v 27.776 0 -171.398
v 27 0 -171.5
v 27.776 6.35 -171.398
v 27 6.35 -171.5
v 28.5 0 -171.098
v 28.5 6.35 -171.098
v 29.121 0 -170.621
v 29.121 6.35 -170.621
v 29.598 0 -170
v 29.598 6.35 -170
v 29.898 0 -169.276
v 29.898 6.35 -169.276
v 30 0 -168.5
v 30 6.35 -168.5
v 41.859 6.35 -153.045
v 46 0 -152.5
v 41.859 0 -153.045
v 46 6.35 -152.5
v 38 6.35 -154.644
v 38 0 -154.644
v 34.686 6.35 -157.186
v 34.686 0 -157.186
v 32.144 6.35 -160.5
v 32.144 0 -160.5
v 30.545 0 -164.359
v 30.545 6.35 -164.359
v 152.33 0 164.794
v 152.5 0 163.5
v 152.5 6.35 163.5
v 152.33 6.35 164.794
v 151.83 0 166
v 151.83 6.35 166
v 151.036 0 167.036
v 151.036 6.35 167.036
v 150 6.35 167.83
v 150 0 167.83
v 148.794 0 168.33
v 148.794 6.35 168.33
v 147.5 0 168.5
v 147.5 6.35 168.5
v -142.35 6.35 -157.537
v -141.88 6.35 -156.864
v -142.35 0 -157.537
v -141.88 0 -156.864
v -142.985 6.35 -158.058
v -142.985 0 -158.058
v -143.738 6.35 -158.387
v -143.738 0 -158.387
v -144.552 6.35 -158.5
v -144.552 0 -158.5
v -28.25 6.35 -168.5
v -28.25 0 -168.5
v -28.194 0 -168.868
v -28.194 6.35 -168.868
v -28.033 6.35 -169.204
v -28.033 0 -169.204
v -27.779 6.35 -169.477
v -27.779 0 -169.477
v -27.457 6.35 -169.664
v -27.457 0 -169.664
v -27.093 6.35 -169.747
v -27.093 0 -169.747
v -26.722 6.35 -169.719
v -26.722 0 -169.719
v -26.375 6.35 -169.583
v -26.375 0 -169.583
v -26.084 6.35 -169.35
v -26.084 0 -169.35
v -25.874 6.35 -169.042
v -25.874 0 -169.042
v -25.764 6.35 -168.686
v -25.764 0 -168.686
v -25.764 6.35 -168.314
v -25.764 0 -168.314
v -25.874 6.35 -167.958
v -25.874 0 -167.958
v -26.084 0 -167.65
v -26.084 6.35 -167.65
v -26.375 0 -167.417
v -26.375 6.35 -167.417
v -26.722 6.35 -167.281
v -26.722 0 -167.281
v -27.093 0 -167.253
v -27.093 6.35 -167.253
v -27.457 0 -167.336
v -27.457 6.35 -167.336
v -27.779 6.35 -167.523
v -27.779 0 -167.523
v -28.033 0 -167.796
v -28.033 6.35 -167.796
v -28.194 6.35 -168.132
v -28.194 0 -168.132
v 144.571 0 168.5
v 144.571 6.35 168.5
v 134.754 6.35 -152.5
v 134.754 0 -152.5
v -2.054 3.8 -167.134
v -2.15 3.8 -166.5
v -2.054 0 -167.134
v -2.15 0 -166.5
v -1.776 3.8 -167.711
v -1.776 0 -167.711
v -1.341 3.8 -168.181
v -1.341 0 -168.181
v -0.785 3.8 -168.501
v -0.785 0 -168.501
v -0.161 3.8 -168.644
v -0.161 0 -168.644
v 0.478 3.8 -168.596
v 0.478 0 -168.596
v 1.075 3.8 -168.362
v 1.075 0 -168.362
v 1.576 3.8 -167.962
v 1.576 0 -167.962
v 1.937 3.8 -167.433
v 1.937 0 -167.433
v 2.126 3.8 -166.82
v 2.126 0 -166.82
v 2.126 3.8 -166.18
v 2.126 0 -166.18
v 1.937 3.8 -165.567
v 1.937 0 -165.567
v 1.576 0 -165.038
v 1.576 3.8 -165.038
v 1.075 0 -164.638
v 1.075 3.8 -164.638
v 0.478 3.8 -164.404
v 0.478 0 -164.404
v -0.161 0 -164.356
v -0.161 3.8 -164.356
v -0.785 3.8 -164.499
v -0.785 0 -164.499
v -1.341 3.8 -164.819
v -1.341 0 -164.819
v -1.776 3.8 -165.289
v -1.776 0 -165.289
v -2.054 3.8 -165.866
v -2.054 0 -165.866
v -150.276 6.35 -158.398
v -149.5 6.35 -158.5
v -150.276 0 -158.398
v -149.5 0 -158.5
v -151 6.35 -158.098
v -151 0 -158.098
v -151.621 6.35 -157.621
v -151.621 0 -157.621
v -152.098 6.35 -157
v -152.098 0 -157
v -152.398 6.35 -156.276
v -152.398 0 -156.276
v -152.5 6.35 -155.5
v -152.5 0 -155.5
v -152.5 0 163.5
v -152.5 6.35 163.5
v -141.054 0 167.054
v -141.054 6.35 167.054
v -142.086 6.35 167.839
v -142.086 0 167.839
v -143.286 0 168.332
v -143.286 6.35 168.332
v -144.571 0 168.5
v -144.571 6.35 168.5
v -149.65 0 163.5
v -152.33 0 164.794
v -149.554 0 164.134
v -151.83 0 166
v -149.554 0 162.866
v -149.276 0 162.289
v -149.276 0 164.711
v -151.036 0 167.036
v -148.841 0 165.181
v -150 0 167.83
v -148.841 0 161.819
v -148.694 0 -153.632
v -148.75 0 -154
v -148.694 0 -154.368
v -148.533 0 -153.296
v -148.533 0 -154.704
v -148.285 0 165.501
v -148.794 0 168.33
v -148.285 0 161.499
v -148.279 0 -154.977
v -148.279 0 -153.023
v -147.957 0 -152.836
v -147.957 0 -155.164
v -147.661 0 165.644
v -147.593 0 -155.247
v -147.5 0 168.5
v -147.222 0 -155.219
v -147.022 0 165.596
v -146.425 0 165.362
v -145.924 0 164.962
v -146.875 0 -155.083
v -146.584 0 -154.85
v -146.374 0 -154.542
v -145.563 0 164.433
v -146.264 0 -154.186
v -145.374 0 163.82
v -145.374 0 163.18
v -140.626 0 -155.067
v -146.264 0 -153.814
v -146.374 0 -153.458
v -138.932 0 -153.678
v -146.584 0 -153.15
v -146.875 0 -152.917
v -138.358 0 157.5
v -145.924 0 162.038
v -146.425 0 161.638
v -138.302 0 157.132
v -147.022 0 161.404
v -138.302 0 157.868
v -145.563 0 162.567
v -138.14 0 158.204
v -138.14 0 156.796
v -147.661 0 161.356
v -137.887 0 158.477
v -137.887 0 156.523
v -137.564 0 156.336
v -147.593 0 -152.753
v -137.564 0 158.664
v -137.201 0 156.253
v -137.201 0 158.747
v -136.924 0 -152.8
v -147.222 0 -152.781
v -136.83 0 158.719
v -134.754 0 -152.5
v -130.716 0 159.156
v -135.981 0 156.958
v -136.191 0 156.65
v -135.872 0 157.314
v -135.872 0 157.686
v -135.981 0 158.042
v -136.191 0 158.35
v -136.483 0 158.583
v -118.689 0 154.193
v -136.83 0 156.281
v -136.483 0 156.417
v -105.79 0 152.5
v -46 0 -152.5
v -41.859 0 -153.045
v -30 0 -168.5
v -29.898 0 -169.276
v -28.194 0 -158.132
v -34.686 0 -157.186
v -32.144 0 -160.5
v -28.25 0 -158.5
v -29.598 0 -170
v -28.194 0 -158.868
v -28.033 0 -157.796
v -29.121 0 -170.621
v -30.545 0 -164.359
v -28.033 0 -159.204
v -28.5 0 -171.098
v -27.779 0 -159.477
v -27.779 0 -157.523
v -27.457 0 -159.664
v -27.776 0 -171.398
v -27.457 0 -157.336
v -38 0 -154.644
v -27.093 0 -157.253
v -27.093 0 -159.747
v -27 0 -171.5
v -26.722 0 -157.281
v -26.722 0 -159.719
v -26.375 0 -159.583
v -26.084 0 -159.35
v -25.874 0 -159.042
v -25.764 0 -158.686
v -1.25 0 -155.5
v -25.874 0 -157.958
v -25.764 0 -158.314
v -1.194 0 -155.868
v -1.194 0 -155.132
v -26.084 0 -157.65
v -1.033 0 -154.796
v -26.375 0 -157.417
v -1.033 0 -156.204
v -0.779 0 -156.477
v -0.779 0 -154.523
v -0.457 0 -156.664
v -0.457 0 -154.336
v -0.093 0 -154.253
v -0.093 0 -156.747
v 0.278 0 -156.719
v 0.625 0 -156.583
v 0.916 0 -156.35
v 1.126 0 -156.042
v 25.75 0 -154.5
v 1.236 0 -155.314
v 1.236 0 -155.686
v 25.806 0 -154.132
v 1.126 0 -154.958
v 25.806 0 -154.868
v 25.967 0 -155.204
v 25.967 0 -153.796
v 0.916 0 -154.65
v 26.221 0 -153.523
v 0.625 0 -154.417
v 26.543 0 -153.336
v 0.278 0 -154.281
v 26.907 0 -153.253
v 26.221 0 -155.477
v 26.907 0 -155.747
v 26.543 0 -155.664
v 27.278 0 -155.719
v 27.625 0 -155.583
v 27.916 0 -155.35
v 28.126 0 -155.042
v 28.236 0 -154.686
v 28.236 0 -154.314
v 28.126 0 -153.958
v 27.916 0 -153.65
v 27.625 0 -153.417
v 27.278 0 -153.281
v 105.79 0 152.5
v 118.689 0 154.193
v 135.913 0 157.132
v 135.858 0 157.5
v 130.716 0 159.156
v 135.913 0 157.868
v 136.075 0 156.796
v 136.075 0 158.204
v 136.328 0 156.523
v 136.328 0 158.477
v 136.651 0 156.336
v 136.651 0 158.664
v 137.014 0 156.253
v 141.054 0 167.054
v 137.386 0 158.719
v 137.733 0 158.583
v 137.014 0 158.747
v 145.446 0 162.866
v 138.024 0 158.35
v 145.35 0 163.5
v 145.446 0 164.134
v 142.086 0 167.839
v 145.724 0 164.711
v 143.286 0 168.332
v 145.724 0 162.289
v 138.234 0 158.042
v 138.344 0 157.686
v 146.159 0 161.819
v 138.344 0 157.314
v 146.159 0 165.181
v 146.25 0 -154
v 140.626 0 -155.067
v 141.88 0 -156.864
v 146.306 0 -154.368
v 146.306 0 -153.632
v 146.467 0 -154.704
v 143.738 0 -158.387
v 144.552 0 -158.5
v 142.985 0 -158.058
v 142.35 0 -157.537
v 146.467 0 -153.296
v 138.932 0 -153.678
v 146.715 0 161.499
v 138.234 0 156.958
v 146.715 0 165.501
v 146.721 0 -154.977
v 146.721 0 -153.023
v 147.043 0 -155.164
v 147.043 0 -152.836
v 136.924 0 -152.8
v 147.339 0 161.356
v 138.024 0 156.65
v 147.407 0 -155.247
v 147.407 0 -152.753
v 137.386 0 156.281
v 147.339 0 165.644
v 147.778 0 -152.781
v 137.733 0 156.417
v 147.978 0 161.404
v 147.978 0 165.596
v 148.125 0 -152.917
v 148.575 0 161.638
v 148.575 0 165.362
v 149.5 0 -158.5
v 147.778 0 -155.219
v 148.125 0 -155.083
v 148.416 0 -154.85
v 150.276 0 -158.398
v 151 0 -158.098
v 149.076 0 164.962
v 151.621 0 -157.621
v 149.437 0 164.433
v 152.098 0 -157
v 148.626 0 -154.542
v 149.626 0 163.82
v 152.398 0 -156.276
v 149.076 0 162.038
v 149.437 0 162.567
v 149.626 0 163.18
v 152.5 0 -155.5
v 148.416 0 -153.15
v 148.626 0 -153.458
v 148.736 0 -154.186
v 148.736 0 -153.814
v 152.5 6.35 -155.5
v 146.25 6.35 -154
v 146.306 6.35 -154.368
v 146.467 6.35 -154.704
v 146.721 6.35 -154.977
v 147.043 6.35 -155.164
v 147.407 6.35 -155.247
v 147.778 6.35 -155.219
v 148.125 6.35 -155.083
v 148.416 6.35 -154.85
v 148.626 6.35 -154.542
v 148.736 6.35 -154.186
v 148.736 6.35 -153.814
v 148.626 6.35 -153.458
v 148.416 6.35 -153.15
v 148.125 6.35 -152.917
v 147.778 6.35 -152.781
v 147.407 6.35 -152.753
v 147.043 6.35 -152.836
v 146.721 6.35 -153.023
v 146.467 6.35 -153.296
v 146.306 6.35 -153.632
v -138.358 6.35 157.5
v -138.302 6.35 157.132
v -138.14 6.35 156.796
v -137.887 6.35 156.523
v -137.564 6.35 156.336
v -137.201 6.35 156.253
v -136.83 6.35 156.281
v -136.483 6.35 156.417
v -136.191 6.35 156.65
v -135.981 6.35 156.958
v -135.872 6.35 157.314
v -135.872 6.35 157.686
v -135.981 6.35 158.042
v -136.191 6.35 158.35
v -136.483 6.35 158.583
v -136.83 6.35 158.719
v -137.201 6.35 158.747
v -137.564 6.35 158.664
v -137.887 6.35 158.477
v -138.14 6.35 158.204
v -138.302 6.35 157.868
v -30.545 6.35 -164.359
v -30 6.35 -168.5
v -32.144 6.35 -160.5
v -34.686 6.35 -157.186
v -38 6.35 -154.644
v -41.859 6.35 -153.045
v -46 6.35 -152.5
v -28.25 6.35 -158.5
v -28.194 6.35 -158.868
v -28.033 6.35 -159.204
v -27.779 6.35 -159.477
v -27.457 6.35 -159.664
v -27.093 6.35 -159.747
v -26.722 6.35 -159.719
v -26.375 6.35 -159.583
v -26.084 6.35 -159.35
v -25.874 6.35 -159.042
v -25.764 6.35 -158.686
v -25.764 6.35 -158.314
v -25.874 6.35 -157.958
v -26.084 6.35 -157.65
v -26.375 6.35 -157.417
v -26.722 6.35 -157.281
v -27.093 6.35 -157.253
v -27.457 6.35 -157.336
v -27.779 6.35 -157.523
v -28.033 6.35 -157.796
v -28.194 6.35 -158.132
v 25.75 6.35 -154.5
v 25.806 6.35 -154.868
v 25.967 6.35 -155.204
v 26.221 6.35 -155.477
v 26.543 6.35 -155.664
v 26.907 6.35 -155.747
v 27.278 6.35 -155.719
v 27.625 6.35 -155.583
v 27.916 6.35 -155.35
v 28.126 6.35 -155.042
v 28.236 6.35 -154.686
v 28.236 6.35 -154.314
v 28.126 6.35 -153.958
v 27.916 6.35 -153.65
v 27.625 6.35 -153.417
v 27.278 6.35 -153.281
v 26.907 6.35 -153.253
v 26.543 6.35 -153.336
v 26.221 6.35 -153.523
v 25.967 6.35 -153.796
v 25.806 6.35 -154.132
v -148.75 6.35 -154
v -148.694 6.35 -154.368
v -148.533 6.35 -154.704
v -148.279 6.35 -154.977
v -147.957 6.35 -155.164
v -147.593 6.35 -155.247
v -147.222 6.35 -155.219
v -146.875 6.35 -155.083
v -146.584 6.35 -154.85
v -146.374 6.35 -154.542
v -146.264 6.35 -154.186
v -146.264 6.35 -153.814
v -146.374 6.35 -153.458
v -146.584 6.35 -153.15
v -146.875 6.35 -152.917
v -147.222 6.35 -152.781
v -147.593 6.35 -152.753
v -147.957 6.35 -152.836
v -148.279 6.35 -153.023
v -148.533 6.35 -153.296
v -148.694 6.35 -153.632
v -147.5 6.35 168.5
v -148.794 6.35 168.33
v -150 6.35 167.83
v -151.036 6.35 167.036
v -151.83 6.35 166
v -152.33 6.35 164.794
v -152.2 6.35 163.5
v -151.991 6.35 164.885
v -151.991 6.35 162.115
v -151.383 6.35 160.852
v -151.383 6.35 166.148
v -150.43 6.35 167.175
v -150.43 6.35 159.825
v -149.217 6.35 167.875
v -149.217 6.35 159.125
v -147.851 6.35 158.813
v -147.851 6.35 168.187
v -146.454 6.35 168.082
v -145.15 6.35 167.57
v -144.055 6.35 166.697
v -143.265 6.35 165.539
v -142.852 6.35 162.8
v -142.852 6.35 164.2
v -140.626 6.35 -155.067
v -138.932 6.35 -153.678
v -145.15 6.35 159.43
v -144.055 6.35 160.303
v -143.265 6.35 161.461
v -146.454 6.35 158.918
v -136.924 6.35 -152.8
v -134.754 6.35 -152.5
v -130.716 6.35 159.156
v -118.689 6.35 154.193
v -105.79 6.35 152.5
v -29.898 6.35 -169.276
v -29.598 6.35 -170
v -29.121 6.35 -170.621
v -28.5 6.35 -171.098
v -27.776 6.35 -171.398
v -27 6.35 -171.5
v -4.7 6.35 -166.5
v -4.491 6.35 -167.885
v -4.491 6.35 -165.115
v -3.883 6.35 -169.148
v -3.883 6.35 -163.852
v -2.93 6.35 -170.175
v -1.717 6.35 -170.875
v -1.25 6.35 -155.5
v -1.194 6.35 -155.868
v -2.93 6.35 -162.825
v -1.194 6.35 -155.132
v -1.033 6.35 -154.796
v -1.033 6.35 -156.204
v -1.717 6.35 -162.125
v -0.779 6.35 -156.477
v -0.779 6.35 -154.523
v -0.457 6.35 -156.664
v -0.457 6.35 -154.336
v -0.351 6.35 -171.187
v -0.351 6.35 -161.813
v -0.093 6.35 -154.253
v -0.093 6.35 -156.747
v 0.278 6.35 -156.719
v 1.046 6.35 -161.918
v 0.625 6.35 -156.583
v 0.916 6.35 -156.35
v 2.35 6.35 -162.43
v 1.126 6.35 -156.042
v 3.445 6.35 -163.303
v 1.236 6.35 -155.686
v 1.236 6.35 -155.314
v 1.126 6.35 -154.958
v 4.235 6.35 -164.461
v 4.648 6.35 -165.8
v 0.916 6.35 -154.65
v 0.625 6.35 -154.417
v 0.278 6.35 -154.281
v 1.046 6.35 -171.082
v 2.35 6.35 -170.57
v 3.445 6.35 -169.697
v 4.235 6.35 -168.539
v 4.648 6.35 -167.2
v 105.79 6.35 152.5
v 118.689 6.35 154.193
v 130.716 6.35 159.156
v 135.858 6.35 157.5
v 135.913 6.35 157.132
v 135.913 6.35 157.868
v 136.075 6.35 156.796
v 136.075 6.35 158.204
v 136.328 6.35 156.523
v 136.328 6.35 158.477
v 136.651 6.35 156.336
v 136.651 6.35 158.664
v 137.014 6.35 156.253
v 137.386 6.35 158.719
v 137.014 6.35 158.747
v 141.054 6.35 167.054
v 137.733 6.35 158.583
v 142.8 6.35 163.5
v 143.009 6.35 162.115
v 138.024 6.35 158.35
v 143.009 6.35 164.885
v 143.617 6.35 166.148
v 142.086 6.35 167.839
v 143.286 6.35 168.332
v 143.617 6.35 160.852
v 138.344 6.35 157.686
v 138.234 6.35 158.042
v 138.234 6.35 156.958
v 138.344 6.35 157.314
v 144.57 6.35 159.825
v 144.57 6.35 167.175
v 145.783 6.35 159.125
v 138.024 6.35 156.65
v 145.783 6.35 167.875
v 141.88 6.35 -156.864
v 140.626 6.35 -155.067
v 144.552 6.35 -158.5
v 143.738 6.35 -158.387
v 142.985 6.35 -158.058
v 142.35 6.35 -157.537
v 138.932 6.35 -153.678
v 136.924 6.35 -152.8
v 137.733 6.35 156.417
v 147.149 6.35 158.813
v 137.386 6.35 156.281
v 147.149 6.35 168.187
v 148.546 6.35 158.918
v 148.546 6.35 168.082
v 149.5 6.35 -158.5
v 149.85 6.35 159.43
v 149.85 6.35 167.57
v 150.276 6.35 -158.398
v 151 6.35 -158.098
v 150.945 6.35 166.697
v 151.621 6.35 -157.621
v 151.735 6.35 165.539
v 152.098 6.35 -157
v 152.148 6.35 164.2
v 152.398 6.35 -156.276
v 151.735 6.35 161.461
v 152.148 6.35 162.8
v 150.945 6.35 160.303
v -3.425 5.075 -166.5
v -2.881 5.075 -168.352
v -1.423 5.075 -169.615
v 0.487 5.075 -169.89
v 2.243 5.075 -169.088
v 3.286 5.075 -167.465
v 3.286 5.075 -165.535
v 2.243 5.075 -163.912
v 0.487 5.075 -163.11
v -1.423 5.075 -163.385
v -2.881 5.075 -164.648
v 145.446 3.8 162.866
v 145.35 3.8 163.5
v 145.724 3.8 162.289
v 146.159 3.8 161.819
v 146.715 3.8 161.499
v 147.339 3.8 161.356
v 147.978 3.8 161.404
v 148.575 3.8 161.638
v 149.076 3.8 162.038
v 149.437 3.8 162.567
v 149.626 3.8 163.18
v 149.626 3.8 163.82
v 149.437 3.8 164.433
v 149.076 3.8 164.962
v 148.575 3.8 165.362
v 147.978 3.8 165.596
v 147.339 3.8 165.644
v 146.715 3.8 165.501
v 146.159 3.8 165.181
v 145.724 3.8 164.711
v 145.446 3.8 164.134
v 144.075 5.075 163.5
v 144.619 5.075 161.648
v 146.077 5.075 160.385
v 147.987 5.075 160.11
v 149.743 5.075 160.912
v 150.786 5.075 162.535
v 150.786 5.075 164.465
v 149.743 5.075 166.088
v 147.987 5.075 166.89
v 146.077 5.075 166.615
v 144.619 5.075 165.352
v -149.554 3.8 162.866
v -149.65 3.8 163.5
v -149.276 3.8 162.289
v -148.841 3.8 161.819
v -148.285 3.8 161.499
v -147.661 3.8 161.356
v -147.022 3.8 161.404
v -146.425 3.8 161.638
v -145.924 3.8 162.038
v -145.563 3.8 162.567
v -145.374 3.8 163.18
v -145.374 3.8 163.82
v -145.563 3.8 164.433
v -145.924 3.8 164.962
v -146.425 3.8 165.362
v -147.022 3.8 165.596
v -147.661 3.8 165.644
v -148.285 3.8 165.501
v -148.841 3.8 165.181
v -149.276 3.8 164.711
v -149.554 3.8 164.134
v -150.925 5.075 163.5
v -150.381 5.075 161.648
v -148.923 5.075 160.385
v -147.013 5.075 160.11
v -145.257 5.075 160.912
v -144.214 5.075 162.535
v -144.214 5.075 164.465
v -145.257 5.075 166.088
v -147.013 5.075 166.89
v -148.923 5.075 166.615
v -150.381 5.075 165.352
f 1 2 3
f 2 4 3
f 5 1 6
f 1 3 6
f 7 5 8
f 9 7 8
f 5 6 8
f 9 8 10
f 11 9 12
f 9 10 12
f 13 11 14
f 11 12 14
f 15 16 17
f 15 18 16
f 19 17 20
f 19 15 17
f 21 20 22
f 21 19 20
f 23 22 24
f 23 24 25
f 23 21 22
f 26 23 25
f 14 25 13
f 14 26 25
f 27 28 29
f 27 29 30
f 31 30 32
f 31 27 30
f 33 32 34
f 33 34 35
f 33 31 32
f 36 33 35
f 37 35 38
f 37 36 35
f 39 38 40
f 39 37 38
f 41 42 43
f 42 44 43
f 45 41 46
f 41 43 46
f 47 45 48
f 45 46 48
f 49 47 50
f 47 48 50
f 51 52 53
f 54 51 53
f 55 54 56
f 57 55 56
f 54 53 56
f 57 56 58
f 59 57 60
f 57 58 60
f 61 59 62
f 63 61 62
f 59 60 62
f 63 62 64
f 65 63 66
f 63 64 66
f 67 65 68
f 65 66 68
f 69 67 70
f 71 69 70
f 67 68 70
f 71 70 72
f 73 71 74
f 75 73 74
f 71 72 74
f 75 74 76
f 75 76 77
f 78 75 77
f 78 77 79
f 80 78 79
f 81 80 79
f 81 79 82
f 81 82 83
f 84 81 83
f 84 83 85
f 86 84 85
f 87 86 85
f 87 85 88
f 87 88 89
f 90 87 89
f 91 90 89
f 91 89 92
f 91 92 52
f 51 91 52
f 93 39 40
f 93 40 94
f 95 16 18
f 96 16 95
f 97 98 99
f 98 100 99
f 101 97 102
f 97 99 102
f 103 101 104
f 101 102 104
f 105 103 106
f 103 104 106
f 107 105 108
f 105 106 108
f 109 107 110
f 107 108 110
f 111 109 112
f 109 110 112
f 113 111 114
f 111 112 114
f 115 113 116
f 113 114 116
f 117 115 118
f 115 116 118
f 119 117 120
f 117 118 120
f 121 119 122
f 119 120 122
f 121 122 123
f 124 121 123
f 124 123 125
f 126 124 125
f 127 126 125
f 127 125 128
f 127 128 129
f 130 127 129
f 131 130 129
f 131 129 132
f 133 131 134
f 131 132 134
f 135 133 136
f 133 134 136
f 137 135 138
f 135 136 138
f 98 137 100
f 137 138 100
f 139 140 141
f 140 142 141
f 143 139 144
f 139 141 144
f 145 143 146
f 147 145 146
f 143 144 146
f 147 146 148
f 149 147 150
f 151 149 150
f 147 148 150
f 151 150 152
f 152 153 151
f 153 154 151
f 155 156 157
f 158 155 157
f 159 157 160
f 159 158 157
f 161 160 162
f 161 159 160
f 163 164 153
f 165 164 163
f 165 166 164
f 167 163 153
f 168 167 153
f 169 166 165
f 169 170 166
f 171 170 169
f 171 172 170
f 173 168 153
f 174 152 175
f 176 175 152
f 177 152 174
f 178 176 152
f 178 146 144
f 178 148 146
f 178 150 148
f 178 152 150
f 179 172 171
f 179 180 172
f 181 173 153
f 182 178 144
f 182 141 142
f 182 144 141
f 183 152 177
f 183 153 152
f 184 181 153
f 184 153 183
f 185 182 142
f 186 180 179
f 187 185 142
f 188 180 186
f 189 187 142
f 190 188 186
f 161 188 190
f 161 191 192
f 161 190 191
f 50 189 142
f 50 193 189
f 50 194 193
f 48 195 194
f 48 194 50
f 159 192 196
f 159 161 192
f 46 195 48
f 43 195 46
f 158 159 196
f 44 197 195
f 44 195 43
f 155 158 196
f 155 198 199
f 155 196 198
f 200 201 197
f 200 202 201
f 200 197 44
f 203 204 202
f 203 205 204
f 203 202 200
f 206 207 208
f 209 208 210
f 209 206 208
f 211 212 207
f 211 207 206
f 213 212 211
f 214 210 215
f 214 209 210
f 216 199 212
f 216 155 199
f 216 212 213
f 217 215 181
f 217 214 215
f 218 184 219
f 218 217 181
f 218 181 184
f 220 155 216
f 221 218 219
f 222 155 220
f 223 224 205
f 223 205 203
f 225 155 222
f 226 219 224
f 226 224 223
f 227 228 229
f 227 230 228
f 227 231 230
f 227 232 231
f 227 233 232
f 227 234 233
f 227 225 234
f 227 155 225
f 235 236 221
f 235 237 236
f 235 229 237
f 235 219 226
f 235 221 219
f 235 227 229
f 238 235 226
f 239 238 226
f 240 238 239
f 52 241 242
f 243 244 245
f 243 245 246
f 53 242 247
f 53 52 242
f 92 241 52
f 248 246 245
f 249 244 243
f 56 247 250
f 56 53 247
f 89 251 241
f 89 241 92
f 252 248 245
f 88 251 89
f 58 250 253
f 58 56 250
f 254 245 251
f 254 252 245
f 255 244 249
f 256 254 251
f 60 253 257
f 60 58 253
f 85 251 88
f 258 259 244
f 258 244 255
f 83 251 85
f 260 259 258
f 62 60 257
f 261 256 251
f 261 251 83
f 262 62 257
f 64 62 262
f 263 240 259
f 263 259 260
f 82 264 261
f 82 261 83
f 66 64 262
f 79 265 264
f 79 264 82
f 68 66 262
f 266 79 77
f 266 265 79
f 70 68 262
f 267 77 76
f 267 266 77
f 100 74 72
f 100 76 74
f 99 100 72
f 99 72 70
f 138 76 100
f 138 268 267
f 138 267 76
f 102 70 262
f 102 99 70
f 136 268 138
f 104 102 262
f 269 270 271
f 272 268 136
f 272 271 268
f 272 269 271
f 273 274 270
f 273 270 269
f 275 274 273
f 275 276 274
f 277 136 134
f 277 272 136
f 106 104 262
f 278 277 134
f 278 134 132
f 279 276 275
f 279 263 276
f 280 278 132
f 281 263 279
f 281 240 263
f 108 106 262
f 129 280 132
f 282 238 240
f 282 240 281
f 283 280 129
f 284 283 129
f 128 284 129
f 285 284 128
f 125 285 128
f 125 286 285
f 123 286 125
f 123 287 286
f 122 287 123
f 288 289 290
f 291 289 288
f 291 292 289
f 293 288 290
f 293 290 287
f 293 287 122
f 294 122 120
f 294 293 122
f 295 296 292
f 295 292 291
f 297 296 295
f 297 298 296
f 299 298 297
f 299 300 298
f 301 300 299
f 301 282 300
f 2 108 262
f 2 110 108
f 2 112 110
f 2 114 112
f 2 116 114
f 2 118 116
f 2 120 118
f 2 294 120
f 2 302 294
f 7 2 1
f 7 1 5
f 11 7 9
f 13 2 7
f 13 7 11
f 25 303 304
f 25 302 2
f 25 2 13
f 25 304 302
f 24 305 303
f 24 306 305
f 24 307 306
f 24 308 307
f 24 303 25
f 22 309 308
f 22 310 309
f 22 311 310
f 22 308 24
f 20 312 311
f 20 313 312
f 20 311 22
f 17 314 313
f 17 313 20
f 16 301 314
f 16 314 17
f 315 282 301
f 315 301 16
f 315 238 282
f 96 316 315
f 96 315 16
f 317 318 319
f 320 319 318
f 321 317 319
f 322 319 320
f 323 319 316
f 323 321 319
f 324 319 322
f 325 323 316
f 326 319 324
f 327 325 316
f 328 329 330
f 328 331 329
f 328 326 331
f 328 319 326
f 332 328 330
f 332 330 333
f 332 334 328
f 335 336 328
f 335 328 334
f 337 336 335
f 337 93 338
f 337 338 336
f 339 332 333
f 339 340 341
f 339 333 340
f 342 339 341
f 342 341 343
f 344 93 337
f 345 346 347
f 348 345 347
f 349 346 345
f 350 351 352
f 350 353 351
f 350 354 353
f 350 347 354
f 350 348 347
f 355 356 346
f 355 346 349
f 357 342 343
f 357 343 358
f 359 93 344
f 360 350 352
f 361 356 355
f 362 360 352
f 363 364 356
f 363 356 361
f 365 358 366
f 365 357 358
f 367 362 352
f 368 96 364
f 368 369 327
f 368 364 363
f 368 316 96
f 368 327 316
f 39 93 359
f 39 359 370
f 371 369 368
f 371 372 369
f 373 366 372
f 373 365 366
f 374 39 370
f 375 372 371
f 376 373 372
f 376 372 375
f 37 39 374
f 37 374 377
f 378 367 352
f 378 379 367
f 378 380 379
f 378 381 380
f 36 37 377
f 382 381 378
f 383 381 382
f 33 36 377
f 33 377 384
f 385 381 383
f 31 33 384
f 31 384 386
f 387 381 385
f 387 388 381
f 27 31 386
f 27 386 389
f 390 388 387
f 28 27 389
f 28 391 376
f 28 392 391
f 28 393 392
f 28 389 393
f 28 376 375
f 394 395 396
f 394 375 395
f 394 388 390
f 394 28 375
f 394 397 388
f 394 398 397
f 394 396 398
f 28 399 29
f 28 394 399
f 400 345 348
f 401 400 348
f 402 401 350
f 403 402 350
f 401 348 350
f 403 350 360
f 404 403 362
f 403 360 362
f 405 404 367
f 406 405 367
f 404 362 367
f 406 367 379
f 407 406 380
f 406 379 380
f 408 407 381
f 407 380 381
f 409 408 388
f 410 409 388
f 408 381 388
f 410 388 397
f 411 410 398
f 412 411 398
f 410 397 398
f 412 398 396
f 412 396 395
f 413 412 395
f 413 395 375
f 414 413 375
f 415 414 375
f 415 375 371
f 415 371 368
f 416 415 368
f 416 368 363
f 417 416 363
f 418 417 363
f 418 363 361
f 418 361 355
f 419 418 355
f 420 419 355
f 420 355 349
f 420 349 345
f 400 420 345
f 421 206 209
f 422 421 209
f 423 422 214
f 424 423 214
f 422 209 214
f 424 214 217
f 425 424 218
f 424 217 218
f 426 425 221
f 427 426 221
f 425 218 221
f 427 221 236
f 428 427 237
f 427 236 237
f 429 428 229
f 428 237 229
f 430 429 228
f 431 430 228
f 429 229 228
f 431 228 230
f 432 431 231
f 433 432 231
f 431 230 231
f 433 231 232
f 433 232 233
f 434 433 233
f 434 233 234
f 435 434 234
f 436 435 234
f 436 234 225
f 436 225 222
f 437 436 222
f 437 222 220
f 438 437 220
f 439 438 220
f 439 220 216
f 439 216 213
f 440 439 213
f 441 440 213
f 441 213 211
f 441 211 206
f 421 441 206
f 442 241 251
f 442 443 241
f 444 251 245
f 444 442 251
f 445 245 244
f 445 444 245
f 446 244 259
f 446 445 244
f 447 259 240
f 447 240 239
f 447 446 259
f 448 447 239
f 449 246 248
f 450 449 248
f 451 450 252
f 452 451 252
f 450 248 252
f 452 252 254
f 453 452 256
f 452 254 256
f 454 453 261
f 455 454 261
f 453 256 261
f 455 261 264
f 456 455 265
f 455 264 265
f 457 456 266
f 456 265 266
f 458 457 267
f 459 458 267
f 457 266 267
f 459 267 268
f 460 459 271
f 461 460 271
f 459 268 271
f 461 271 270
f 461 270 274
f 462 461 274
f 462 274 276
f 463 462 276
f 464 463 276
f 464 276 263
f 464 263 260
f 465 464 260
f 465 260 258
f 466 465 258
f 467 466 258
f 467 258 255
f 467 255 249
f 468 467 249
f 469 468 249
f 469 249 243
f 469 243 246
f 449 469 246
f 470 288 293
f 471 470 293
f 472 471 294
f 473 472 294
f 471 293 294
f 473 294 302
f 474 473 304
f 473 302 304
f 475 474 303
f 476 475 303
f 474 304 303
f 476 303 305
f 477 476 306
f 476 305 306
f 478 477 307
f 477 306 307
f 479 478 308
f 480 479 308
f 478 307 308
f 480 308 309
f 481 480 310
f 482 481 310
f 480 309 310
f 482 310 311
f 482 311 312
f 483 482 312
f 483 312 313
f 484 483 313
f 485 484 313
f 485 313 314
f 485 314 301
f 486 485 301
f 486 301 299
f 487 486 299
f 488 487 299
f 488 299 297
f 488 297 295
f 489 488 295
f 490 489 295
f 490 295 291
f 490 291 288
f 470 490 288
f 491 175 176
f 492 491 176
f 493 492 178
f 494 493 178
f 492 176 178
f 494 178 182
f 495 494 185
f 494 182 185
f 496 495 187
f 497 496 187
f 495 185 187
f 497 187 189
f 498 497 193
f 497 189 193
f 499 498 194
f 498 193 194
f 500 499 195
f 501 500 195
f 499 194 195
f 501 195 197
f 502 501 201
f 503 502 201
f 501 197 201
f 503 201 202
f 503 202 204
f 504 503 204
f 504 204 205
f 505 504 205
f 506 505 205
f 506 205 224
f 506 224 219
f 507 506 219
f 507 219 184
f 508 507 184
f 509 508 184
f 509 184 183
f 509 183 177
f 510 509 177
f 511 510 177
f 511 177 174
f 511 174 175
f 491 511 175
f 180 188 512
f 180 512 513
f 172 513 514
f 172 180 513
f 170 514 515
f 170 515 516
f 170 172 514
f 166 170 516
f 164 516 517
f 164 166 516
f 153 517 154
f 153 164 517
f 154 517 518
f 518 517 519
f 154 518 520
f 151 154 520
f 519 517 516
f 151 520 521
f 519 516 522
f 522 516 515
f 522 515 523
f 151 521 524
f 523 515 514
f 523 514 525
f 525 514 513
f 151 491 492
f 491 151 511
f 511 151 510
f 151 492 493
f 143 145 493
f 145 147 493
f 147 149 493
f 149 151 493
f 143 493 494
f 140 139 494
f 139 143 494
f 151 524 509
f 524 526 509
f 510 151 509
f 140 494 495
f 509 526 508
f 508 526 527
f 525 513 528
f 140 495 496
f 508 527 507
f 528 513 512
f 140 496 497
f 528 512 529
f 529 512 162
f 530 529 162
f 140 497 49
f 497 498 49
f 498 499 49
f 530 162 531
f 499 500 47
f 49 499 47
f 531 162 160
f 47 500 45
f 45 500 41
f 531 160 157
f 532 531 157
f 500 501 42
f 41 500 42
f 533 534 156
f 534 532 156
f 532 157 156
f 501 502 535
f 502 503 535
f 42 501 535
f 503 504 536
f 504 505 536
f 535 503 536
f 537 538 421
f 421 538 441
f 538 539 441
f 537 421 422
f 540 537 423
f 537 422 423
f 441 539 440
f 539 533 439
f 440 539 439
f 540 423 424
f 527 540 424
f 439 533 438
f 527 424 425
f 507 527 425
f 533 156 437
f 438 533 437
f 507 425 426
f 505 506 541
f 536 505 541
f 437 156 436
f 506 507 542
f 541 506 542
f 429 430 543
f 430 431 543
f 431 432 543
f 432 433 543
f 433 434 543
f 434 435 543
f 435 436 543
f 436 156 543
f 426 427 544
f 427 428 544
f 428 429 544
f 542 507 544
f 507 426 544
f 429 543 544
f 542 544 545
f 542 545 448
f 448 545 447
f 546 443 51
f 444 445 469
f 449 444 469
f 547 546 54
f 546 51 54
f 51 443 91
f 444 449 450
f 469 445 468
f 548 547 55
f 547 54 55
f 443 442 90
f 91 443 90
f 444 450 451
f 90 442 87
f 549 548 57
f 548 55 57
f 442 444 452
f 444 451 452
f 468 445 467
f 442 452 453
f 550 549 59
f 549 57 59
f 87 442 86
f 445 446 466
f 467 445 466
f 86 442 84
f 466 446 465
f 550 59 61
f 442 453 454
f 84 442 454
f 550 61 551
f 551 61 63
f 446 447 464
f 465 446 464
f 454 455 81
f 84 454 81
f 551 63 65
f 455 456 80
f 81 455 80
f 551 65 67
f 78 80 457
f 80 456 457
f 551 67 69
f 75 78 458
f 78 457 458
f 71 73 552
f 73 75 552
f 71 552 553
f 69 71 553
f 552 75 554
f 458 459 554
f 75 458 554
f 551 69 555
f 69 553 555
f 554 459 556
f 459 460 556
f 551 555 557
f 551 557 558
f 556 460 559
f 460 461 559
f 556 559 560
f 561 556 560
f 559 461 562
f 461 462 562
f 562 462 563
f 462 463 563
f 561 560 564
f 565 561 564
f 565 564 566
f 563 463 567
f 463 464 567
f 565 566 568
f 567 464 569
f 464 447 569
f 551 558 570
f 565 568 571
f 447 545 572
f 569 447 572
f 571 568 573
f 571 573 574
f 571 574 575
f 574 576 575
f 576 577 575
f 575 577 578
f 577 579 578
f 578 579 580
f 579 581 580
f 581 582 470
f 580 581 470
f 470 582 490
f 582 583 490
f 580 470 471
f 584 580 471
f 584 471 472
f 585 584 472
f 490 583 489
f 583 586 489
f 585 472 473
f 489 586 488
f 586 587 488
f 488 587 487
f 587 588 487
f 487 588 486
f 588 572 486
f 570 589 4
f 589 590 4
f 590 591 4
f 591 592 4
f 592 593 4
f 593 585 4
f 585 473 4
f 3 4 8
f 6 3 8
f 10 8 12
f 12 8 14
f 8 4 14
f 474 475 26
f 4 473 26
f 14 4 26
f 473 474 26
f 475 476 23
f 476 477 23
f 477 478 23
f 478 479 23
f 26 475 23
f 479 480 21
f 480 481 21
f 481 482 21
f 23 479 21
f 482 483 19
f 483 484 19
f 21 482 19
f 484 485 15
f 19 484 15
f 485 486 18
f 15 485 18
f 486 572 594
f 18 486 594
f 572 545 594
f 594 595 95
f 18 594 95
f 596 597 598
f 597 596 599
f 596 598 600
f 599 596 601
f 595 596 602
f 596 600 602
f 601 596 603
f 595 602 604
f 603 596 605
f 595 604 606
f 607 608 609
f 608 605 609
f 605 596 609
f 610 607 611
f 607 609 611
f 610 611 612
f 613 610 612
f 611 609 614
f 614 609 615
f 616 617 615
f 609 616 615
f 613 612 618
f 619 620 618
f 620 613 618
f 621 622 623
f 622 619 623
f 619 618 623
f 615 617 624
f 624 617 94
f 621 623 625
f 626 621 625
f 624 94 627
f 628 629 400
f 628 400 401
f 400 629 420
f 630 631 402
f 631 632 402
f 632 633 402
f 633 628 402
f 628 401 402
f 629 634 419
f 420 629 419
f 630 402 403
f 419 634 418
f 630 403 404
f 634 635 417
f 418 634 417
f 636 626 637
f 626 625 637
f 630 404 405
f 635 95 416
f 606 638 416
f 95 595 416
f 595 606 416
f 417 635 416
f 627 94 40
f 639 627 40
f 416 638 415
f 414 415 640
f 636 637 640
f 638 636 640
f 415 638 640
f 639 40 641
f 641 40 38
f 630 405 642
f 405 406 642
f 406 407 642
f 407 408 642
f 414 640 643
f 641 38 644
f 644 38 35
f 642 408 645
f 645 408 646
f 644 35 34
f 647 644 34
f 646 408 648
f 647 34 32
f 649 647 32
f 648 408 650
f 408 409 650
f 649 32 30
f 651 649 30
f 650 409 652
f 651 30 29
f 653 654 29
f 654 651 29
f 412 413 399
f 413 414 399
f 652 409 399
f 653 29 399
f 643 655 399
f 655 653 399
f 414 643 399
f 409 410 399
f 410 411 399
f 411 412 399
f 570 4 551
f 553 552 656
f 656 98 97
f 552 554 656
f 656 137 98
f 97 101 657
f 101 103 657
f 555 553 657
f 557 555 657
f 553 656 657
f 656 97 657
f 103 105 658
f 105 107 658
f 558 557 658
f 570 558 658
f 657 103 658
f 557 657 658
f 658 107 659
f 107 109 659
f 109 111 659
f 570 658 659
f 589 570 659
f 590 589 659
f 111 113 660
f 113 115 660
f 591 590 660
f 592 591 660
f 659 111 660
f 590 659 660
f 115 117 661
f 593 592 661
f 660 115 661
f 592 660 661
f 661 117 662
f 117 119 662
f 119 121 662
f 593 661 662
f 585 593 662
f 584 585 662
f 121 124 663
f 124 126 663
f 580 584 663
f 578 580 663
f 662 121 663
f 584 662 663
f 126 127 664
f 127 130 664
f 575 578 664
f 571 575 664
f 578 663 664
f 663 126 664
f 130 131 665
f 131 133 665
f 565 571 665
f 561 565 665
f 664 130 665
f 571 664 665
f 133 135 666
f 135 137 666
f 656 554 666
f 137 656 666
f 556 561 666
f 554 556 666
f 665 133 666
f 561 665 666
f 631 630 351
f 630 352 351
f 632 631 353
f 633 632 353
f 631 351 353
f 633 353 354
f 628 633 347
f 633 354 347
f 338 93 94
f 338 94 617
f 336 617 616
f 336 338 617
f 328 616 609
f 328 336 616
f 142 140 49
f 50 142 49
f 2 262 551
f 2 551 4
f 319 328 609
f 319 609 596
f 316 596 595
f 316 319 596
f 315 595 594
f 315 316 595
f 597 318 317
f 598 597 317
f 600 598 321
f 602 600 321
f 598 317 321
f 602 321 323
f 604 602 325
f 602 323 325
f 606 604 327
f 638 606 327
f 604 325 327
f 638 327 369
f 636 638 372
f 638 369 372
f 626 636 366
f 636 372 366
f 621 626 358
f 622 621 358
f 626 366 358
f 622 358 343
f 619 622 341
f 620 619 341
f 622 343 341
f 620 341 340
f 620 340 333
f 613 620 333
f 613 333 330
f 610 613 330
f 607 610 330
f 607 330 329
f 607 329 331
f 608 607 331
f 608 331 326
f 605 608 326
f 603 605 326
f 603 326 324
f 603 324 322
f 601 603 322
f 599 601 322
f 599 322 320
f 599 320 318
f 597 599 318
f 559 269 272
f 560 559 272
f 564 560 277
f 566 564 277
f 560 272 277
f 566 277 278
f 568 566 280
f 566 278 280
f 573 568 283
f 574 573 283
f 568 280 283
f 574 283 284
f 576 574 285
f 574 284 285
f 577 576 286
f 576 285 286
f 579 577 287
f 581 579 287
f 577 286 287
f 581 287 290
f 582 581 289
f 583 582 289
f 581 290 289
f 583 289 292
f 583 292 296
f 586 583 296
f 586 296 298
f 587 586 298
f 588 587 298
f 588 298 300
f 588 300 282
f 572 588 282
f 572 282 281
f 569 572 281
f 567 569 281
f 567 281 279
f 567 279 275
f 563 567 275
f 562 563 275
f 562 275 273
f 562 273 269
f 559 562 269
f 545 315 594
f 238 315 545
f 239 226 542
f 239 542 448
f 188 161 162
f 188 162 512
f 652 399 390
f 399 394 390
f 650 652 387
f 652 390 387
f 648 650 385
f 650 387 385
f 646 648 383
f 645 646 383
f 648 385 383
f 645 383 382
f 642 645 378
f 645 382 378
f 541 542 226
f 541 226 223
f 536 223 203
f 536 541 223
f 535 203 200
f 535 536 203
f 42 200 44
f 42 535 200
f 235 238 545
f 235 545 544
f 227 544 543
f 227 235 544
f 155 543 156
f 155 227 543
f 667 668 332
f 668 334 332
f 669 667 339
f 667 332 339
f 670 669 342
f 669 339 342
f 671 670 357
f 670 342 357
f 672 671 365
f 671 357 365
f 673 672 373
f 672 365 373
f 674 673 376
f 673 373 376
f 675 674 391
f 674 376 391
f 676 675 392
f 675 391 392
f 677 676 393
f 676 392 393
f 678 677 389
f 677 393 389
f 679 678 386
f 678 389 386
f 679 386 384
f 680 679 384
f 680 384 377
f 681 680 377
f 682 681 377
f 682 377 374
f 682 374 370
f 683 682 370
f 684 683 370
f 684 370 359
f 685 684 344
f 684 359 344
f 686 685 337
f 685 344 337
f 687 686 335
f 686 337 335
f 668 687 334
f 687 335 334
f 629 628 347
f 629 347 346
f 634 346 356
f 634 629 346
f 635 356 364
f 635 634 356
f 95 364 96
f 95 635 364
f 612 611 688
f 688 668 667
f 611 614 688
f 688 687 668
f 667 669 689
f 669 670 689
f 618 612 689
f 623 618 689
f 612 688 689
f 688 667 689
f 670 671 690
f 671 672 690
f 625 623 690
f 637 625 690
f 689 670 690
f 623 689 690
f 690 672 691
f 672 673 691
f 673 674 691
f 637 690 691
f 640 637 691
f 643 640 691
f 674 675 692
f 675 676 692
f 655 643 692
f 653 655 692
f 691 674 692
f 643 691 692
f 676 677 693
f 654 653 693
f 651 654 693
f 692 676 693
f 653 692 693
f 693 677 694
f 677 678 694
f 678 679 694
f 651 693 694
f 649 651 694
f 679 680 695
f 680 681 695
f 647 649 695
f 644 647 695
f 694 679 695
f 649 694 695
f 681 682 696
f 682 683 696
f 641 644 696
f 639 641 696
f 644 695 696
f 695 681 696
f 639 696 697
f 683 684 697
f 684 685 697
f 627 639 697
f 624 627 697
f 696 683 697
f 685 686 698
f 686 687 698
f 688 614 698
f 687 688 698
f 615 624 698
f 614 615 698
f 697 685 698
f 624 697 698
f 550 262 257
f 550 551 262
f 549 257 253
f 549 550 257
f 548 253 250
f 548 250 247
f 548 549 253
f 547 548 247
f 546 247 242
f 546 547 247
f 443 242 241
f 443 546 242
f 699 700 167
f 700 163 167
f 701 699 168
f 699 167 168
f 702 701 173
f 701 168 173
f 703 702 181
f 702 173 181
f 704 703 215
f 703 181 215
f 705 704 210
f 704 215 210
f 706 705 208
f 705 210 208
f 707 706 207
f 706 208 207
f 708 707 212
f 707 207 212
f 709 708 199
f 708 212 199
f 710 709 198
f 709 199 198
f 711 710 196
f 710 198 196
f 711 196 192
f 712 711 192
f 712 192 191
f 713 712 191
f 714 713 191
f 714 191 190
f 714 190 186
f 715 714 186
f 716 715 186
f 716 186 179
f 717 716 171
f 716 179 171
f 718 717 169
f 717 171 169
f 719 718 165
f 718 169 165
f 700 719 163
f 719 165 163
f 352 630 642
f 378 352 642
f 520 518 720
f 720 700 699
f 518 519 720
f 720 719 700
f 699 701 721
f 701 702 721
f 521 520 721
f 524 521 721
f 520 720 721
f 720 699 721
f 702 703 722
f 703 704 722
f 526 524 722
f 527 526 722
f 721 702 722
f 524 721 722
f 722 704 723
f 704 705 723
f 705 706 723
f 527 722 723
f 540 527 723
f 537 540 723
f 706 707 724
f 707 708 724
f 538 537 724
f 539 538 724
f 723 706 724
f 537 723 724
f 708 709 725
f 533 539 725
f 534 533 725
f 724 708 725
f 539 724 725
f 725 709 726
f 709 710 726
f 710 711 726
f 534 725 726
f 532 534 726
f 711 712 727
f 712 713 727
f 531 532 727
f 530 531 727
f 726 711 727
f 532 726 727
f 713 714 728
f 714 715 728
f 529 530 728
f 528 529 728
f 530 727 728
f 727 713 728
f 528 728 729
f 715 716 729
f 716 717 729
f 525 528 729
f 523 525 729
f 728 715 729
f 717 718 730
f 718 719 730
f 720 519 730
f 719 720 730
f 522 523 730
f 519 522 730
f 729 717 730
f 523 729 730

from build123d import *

# Parameters (mm, degrees)
BOSS_EXTRUDE1_DEPTH                             = 6.35
CSK_FOR_M4_FLAT_HEAD_MACHINE_SCREW1_D           = 4.3
CSK_FOR_M4_FLAT_HEAD_MACHINE_SCREW1_CSINK_D     = 9.4
CSK_FOR_M4_FLAT_HEAD_MACHINE_SCREW1_CSINK_ANGLE = 90
CHAMFER1_SIZE                                   = 16
SKETCH6_W                                       = 10
SKETCH6_H                                       = 6
BOSS_EXTRUDE2_DEPTH                             = 6.35
FILLET5_R                                       = 8
M3X0_5_TAPPED_HOLE1_D                           = 2.5
FILLET6_START                                   = -1
FILLET6_DEPTH                                   = 8
SKETCH18_W                                      = 25
SKETCH18_H                                      = 19
BOSS_EXTRUDE4_DEPTH                             = 6.35
FILLET12_R                                      = 3
M3X0_5_TAPPED_HOLE2_D                           = 2.5
FILLET13_R                                      = 50
FILLET14_R                                      = 16


with BuildPart() as part:
    # Sketch1 → Boss-Extrude1 (new body)
    with BuildSketch(Plane(origin=(0, 0, 0), x_dir=(1, 0, 0), z_dir=(0, 1, 0))):
        Polygon((-5, 171.5), (5, 171.5), (5, 152.5), (152.5, 152.5), (152.5, -168.5), (142.5, -168.5), (142.5, -152.5), (-142.5, -152.5), (-142.5, -168.5), (-152.5, -168.5), (-152.5, 152.5), (-5, 152.5), align=None)
    extrude(amount=BOSS_EXTRUDE1_DEPTH)

    # CSK for M4 Flat Head Machine Screw1 (through all)
    with Locations(Plane(origin=(0, 6.35, 0), x_dir=(1, 0, 0), z_dir=(0, 1, 0))):
        with Locations((0, 166.5), (-147.5, -163.5), (147.5, -163.5)):
            CounterSinkHole(CSK_FOR_M4_FLAT_HEAD_MACHINE_SCREW1_D / 2, CSK_FOR_M4_FLAT_HEAD_MACHINE_SCREW1_CSINK_D / 2, counter_sink_angle=CSK_FOR_M4_FLAT_HEAD_MACHINE_SCREW1_CSINK_ANGLE)

    # Chamfer1
    chamfer1_edges = [part.edges().sort_by_distance(p)[0] for p in [
        (142.5, 3.175, 152.5),
        (-142.5, 3.175, 152.5),
    ]]
    chamfer(chamfer1_edges, length=CHAMFER1_SIZE - 0.0001)  # a hair under: the kernel refuses the full size

    # Sketch6 → Boss-Extrude2 (add)
    with BuildSketch(Plane(origin=(0, 6.35, 0), x_dir=(1, 0, 0), z_dir=(0, 1, 0))):
        with Locations((-147.5, 155.5)):
            Rectangle(SKETCH6_W, SKETCH6_H)
        with Locations((147.5, 155.5)):
            Rectangle(SKETCH6_W, SKETCH6_H)
    extrude(amount=-BOSS_EXTRUDE2_DEPTH)

    # Fillet5
    # the kernel refuses this fillet: 8 mm, written as the material it adds along each edge
    with BuildSketch(Plane(origin=(142.5, 6.35, -152.5), x_dir=(0, 0, -1), z_dir=(0, -1, 0))) as fillet5_piece_1:
        with BuildLine():
            CenterArc((8, -7.745966692), FILLET5_R, 104.477512186, 75.522487814)
            Line((0, -7.745966692), (-0.16, -7.745966692))
            Line((-0.16, -7.745966692), (-0.16, 0))
            Line((-0.16, 0), (0, 0.16))
            ThreePointArc((0, 0.16), (3, 0.16), (5.96, 0.154919334))
            Line((5.96, 0.154919334), (6, 0))
        make_face()
    extrude(amount=6.35)
    with BuildSketch(Plane(origin=(-142.5, 6.35, -152.5), x_dir=(1, 0, 0), z_dir=(0, -1, 0))) as fillet5_piece_2:
        with BuildLine():
            CenterArc((7.745966692, -8), FILLET5_R, 90, 75.522487814)
            Line((0, -6), (-0.154919334, -5.96))
            ThreePointArc((-0.154919334, -5.96), (-0.16, -3), (-0.16, 0))
            Line((-0.16, 0), (0, 0.16))
            Line((0, 0.16), (7.745966692, 0.16))
            Line((7.745966692, 0.16), (7.745966692, 0))
        make_face()
    extrude(amount=6.35)

    # M3x0.5 Tapped Hole1 (through all)
    with Locations(Plane(origin=(0, 6.35, 0), x_dir=(1, 0, 0), z_dir=(0, 1, 0))):
        with Locations((-147.5, 154), (147.5, 154), (137.107695155, -157.5), (-137.107695155, -157.5), (0, 155.5)):
            Hole(M3X0_5_TAPPED_HOLE1_D / 2)

    # Fillet6: read off the stored shape, not the designer's step
    # Fillet6 outline → Fillet6 (cut)
    with BuildSketch(Plane(origin=(0, 0, 0), x_dir=(1, 0, 0), z_dir=(0, 1, 0)).offset(FILLET6_START)):
        with BuildLine():
            ThreePointArc((152.5, -163.5), (151.035533906, -167.035533906), (147.5, -168.5))
            Line((147.5, -168.5), (152.5, -168.5))
            Line((152.5, -168.5), (152.5, -163.5))
        make_face()
        with BuildLine():
            ThreePointArc((144.571067812, -168.5), (142.65765065, -168.119397663), (141.035533906, -167.035533906))
            Line((141.035533906, -167.035533906), (142.5, -168.5))
            Line((142.5, -168.5), (144.571067812, -168.5))
        make_face()
        with BuildLine():
            ThreePointArc((-141.035533906, -167.035533906), (-142.65765065, -168.119397663), (-144.571067812, -168.5))
            Line((-144.571067812, -168.5), (-142.5, -168.5))
            Line((-142.5, -168.5), (-141.035533906, -167.035533906))
        make_face()
        with BuildLine():
            Line((-152.5, -168.5), (-147.5, -168.5))
            ThreePointArc((-147.5, -168.5), (-151.035533906, -167.035533906), (-152.5, -163.5))
            Line((-152.5, -163.5), (-152.5, -168.5))
        make_face()
    extrude(amount=FILLET6_DEPTH, mode=Mode.SUBTRACT)

    # Sketch18 → Boss-Extrude4 (add)
    with BuildSketch(Plane.XZ):
        with Locations((17.5, -162)):
            Rectangle(SKETCH18_W, SKETCH18_H)
        with Locations((-17.5, -162)):
            Rectangle(SKETCH18_W, SKETCH18_H)
    extrude(amount=-BOSS_EXTRUDE4_DEPTH)

    # Fillet12
    fillet12_edges = [part.edges().sort_by_distance(p)[0] for p in [
        (30, 3.175, -171.5),
        (-30, 3.175, -171.5),
        (-142.5, 3.175, -158.5),
        (-152.5, 3.175, -158.5),
        (142.5, 3.175, -158.5),
        (152.5, 3.175, -158.5),
    ]]
    fillet(fillet12_edges, radius=FILLET12_R)

    # M3x0.5 Tapped Hole2 (through all)
    with Locations(Plane(origin=(0, 6.35, 0), x_dir=(1, 0, 0), z_dir=(0, 1, 0))):
        with Locations((27, 154.5), (-27, 168.5), (-27, 158.5)):
            Hole(M3X0_5_TAPPED_HOLE2_D / 2)

    # Fillet13
    # the kernel refuses this fillet: 50 mm, written as the material it adds along each edge
    with BuildSketch(Plane(origin=(126.5001, 0, 152.5), x_dir=(-1, 0, 0), z_dir=(0, 1, 0))) as fillet13_piece_1:
        with BuildLine():
            CenterArc((20.710446515, 50), FILLET13_R, 225.146645298, 44.853354702)
            Line((-14.554286856, 14.554286856), (-15.259581524, 13.845372594))
            Line((-15.259581524, 13.845372594), (-0.707106781, -0.707106781))
            Line((-0.707106781, -0.707106781), (0, -1))
            Line((0, -1), (20.710446515, -1))
            Line((20.710446515, -1), (20.710446515, 0))
        make_face()
    extrude(amount=6.35)
    with BuildSketch(Plane(origin=(-126.5001, 0, 152.5), x_dir=(-0.7071067811865476, 0, 0.7071067811865476), z_dir=(0, 1, 0))) as fillet13_piece_2:
        with BuildLine():
            CenterArc((20.710841887, 49.999836231), FILLET13_R, 225, 44.853354702)
            Line((-14.644497172, 14.644497172), (-15.351603953, 13.937390391))
            Line((-15.351603953, 13.937390391), (-0.707106781, -0.707106781))
            Line((-0.707106781, -0.707106781), (0, -1))
            Line((0, -1), (20.580310423, -0.999996725))
            Line((20.580310423, -0.999996725), (20.582869863, 0))
        make_face()
    extrude(amount=6.35)

    # Fillet14
    fillet14_edges = [part.edges().sort_by_distance(p)[0] for p in [
        (30, 3.175, -152.5),
        (-30, 3.175, -152.5),
    ]]
    fillet(fillet14_edges, radius=FILLET14_R - 0.0001)  # a hair under: the kernel refuses the full size


solid = part.part
